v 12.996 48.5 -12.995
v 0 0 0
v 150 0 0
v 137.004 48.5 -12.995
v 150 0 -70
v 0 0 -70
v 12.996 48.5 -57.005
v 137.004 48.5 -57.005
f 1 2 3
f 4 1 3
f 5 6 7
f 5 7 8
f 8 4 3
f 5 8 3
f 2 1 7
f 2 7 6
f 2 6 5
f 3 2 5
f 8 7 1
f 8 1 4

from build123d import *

# Parameters (mm, degrees)
ESQUISSE2_W      = 150
ESQUISSE2_H      = 70
EXTRUSION1_DEPTH = 48.5
EXTRUSION2_REACH = 174.488
CHANFREIN1_SIZE2 = 48.5
CHANFREIN1_SIZE  = 12.995535833
CHANFREIN2_SIZE2 = 48.5
CHANFREIN2_SIZE  = 12.995535833


with BuildPart() as part:
    # Esquisse2 → Extrusion1 (new body)
    with BuildSketch(Plane(origin=(0, 0, 0), x_dir=(1, 0, 0), z_dir=(0, 1, 0))):
        with Locations((75, 35)):
            Rectangle(ESQUISSE2_W, ESQUISSE2_H)
    extrude(amount=EXTRUSION1_DEPTH)

    # Esquisse3 → Extrusion2 (cut, up to next)
    with BuildSketch(Plane.XY, mode=Mode.PRIVATE) as extrusion2_sk1:
        Polygon((0, 0), (0, 48.5), (12.995535833, 48.5), align=None)
    extrusion2_tool1 = extrude(extrusion2_sk1.sketch, amount=-EXTRUSION2_REACH, mode=Mode.PRIVATE) & part.part
    # Esquisse3 → Extrusion2 (cut, up to next)
    with BuildSketch(Plane.XY, mode=Mode.PRIVATE) as extrusion2_sk2:
        Polygon((137.004464167, 48.5), (150, 0), (150, 48.5), align=None)
    extrusion2_tool2 = extrude(extrusion2_sk2.sketch, amount=-EXTRUSION2_REACH, mode=Mode.PRIVATE) & part.part
    add(extrusion2_tool1.solids().sort_by_distance((4.331845, 32.333333, 0))[0], mode=Mode.SUBTRACT)
    add(extrusion2_tool2.solids().sort_by_distance((145.668155, 32.333333, 0))[0], mode=Mode.SUBTRACT)

    # Chanfrein1
    chanfrein1_edges = [part.edges().sort_by_distance(p)[0] for p in [
        (75, 48.5, -70),
    ]]
    chanfrein1_side = [part.faces().sort_by_distance(p)[0] for p in [
        (75, 48.5, -69.740089283),
    ]]
    chamfer(chanfrein1_edges, length=CHANFREIN1_SIZE - 0.0001, length2=CHANFREIN1_SIZE2 - 0.0001, reference=chanfrein1_side[0])  # a hair under: the kernel refuses the full size

    # Chanfrein2
    chanfrein2_edges = [part.edges().sort_by_distance(p)[0] for p in [
        (75, 48.5, 0),
    ]]
    chanfrein2_side = [part.faces().sort_by_distance(p)[0] for p in [
        (75, 48.5, -0.259910717),
    ]]
    chamfer(chanfrein2_edges, length=CHANFREIN2_SIZE - 0.0001, length2=CHANFREIN2_SIZE2 - 0.0001, reference=chanfrein2_side[0])  # a hair under: the kernel refuses the full size


solid = part.part
